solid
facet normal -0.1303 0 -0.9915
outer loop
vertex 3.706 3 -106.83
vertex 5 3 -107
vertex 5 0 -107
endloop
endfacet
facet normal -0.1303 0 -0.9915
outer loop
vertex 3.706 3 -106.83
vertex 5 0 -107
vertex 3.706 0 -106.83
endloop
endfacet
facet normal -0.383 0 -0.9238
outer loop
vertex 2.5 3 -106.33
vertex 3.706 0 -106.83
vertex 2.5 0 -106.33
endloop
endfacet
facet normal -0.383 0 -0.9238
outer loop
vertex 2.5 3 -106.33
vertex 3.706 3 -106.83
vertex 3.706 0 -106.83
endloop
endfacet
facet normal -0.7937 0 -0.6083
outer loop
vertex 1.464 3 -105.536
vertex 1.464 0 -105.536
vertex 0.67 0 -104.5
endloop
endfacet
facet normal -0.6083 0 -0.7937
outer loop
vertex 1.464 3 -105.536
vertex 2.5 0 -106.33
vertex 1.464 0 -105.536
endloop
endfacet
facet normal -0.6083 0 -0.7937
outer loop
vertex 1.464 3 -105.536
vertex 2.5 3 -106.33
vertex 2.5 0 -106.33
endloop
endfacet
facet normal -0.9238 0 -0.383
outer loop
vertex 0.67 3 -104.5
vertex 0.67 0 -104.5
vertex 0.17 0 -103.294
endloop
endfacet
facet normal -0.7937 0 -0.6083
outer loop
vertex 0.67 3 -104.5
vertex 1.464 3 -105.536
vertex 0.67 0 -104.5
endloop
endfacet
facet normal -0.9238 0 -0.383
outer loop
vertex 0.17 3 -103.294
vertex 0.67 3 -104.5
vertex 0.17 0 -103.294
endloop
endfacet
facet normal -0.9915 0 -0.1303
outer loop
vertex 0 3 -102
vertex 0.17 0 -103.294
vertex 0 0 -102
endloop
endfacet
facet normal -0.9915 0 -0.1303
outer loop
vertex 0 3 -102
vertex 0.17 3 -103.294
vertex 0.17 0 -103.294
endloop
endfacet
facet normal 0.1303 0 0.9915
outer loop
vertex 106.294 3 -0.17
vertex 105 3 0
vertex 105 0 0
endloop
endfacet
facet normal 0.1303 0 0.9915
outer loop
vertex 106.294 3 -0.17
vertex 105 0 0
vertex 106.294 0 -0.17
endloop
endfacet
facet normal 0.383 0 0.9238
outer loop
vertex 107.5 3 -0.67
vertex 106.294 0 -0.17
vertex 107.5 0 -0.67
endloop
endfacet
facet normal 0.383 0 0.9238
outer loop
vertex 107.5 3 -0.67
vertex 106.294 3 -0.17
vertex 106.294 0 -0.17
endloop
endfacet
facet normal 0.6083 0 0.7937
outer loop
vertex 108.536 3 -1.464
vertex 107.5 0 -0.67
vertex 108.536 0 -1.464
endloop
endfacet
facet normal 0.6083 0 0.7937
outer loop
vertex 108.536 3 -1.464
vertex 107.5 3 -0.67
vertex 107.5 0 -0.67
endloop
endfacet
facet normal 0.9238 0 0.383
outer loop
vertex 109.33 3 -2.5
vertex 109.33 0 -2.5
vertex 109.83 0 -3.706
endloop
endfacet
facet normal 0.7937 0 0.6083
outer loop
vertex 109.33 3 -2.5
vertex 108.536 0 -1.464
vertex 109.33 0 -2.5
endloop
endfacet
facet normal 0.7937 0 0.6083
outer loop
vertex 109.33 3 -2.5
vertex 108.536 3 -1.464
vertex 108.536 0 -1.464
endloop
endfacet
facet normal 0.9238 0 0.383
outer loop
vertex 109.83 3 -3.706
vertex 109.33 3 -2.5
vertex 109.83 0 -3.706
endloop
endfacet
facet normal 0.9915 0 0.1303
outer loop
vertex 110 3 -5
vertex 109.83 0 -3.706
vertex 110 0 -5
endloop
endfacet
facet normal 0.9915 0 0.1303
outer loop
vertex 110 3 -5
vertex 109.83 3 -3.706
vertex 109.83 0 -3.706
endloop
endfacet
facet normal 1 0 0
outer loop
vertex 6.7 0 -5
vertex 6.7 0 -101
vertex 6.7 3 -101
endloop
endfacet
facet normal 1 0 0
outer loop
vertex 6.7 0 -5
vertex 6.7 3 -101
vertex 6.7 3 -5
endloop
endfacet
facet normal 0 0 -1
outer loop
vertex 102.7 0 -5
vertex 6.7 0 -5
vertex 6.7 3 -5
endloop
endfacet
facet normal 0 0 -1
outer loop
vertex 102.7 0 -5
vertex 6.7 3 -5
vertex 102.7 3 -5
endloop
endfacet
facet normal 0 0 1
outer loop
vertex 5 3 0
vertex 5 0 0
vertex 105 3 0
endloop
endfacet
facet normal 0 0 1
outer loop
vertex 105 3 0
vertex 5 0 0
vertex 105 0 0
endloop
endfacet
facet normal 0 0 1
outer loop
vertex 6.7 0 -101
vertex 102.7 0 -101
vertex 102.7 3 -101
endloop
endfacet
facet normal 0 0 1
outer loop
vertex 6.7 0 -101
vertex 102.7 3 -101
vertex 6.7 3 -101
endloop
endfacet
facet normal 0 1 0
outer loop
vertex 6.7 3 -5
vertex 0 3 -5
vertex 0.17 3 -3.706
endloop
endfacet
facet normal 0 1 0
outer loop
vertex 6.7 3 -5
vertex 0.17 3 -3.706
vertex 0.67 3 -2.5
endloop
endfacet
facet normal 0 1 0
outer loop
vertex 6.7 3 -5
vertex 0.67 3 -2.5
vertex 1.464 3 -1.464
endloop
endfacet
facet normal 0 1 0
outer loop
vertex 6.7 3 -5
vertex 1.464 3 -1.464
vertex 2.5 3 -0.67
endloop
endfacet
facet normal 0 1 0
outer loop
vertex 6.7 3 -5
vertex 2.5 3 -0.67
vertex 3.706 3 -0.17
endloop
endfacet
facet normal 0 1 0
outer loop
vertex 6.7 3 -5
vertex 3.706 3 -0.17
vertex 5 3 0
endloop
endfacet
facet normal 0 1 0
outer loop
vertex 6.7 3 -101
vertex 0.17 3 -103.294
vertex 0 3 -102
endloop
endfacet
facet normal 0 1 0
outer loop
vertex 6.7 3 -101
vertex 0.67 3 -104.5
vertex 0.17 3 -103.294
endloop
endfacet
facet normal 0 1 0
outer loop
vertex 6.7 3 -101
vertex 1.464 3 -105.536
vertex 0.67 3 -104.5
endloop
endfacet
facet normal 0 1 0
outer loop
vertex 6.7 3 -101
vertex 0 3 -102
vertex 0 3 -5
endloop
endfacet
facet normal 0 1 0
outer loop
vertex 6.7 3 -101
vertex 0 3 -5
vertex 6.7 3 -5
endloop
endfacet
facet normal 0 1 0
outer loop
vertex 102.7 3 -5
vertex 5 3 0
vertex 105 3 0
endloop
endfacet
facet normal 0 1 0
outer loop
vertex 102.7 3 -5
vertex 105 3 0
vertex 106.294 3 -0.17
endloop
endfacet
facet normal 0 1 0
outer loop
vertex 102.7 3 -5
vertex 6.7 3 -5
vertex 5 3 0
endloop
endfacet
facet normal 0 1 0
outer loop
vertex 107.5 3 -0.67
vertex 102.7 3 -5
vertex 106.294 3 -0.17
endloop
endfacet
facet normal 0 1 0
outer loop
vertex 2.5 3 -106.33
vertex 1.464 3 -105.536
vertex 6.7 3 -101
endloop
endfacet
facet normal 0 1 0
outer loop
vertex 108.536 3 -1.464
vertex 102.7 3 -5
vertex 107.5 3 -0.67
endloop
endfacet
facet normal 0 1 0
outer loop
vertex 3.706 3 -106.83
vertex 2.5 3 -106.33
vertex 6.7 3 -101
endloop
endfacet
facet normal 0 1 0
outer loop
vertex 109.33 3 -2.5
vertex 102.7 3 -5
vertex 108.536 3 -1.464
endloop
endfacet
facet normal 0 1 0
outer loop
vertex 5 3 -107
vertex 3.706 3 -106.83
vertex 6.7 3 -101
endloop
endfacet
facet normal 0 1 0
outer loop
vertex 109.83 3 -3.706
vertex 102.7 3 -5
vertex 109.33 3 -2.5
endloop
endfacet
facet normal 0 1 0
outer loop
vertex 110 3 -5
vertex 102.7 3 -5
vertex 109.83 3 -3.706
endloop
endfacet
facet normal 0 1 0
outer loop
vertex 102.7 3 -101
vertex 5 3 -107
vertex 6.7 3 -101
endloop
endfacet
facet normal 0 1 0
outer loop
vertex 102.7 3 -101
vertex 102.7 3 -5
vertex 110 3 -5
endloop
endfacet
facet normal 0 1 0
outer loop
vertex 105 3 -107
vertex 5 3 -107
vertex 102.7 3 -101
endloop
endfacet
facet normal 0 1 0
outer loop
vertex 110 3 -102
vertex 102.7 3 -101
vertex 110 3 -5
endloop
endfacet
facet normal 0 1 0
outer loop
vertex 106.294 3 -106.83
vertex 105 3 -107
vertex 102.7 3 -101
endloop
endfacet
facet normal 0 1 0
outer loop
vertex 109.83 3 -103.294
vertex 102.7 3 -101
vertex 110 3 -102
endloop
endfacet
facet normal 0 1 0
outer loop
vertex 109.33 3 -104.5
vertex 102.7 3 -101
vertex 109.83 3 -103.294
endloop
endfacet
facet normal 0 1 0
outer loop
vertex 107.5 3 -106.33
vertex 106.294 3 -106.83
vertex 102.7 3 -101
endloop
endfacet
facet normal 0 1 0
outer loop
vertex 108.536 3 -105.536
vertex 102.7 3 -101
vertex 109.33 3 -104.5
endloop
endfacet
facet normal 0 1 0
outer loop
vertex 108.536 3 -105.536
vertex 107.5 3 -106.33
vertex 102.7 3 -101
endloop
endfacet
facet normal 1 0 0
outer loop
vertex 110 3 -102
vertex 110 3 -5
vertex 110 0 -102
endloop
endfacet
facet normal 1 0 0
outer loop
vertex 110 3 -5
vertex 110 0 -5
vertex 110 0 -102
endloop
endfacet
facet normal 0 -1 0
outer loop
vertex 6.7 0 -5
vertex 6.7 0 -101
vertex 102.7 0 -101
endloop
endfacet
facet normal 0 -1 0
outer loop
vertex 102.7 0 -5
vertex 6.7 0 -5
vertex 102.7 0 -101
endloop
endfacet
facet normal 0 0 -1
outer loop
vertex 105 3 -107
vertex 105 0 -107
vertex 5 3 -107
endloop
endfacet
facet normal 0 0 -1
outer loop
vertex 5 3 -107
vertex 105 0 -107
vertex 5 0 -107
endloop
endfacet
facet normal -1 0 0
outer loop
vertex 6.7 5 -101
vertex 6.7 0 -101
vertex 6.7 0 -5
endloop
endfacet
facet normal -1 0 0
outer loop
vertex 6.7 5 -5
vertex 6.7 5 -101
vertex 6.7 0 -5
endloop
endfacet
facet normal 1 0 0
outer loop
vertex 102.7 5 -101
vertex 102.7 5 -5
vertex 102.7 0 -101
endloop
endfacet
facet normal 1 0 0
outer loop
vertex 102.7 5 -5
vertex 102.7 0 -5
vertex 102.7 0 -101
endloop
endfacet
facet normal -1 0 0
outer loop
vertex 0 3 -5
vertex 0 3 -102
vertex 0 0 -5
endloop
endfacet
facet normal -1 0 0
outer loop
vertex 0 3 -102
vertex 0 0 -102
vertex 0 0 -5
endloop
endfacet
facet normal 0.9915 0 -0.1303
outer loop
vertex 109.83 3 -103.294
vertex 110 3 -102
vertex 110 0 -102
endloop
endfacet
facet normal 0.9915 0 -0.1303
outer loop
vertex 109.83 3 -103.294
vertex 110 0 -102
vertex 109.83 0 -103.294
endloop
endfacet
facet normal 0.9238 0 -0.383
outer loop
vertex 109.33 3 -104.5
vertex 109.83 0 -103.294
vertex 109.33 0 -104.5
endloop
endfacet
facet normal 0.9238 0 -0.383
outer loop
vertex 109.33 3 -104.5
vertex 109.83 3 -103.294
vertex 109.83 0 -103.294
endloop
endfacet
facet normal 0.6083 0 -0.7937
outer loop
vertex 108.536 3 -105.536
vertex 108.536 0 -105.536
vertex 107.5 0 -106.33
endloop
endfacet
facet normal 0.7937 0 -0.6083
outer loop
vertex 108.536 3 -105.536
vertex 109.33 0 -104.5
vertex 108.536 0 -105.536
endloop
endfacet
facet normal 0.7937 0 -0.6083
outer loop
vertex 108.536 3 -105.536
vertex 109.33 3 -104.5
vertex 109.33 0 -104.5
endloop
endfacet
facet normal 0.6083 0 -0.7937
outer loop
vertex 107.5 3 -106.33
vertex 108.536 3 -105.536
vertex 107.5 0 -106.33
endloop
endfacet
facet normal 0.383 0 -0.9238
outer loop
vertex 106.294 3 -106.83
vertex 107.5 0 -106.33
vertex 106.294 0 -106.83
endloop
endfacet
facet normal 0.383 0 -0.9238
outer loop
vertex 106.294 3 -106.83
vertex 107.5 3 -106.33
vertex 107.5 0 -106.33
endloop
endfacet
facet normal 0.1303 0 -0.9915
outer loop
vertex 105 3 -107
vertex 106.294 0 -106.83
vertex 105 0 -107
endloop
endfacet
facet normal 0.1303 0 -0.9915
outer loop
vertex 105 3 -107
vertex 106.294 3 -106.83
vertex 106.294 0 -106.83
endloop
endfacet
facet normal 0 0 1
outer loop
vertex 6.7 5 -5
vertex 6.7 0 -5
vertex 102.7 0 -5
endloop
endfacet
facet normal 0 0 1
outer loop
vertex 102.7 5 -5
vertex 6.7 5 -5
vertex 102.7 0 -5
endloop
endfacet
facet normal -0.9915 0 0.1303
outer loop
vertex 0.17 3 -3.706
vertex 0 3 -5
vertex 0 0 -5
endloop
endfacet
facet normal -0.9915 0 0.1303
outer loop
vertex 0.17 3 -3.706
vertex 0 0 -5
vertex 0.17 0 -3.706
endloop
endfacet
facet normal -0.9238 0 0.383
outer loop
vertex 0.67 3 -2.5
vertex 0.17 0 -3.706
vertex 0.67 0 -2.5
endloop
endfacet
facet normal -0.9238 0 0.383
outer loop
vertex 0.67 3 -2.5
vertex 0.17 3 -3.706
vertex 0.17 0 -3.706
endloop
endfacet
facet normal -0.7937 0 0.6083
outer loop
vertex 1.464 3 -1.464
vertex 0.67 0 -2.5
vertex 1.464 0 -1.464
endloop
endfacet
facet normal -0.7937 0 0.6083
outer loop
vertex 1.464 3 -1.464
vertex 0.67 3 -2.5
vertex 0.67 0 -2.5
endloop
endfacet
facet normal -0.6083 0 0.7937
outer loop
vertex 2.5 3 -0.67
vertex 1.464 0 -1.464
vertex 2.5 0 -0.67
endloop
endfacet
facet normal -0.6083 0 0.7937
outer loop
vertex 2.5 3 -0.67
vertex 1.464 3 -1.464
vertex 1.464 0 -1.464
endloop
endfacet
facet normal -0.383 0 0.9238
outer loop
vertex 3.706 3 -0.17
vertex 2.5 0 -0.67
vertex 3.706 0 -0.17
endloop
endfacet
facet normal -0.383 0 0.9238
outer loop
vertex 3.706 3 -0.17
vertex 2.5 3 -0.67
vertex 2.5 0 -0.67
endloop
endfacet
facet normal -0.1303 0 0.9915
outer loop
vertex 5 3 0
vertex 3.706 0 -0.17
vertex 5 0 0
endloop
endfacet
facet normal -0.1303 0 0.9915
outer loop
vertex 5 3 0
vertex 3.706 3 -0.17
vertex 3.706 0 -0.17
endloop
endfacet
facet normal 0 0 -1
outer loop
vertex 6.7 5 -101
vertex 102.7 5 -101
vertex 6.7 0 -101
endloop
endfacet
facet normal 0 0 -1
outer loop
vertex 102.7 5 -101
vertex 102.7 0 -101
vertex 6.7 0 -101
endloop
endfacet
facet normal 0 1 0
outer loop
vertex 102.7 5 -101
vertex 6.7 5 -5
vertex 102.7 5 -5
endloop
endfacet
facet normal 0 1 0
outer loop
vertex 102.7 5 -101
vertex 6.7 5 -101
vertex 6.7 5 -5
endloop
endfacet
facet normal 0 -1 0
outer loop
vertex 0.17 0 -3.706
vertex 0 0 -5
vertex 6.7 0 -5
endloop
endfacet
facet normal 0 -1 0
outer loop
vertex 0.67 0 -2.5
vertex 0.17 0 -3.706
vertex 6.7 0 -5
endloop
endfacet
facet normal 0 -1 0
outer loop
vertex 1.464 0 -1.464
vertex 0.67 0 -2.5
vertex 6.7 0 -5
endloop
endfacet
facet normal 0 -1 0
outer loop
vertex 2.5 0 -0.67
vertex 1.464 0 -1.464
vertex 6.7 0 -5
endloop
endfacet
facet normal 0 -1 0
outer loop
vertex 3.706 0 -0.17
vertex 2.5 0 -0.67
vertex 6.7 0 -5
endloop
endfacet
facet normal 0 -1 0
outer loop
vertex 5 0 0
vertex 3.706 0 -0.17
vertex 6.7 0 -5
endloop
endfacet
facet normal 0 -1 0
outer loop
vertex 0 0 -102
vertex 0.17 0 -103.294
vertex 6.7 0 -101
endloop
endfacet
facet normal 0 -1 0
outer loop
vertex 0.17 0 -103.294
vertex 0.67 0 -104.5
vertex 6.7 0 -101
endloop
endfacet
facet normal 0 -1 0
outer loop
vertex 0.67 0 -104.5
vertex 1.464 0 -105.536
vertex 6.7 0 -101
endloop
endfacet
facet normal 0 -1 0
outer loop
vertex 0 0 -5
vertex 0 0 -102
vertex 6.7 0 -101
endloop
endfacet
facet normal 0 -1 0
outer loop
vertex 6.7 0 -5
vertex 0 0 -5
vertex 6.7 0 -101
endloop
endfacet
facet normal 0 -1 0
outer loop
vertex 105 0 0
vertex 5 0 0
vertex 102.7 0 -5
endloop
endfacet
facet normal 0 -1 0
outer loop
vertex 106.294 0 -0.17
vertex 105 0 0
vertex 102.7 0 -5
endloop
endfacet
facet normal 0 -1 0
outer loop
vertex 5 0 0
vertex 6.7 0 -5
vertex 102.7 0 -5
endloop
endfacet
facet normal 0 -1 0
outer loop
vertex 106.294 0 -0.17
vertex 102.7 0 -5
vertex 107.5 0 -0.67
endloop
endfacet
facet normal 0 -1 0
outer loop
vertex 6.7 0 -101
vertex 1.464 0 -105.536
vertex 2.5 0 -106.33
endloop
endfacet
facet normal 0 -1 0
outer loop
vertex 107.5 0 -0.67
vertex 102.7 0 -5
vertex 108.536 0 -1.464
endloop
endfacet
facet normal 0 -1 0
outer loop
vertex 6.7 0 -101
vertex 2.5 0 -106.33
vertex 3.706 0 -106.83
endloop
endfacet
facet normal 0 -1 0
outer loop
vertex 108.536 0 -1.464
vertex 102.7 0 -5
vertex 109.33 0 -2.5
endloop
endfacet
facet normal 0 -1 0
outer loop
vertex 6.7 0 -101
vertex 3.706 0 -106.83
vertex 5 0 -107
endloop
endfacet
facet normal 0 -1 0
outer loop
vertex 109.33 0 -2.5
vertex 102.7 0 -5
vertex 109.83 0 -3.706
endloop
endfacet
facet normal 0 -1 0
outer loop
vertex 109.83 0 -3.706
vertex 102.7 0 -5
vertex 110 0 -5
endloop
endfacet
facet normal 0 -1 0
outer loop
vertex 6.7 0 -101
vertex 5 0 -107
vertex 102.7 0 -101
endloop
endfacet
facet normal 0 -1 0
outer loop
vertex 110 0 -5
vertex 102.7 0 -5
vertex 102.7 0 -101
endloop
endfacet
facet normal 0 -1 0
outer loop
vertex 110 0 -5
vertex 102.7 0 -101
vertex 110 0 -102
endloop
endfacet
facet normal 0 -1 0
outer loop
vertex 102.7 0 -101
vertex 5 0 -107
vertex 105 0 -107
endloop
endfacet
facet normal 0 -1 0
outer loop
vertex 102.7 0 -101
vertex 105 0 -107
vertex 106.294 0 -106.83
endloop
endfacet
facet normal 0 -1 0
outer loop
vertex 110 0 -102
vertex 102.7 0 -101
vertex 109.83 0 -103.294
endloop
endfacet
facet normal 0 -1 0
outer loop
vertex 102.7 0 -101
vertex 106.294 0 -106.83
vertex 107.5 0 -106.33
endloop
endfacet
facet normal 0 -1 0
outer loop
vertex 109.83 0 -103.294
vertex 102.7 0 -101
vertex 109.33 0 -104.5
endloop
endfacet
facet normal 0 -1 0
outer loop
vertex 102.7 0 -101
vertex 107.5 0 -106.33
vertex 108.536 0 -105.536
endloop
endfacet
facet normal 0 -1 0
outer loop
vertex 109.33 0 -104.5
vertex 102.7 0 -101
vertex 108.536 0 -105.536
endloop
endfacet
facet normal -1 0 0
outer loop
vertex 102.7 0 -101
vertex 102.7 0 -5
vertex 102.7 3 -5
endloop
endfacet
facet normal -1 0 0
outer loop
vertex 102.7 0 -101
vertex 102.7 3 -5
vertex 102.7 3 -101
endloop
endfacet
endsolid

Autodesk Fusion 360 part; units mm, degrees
sketch "Sketch1" plane through (0, 0, 0) normal (0, 1, 0) x (1, 0, 0)
  line L0 (0, 0) -> (110, 0)
  line L1 (110, 0) -> (110, 107)
  line L2 (110, 107) -> (0, 107)
  line L3 (0, 107) -> (0, 0)
  line L4 (6.7, 5) -> (102.7, 5)
  line L5 (102.7, 5) -> (102.7, 101)
  line L6 (102.7, 101) -> (6.7, 101)
  line L7 (6.7, 101) -> (6.7, 5)
  dimension "d1" = 110
  dimension "d2" = 107
  dimension "d3" = 96
  dimension "d4" = 5
  dimension "d5" = 96
  dimension "d6" = 5.4
  dimension "d7" = 6.7
  dimension "d8" = 7.3
extrude "Extrude2" add sketch "Sketch1" along normal blind 3 makes body 1
extrude "Extrude1" add sketch "Sketch1" along normal blind 5 separate body contours L4 L5 L6 L7 makes body 2
fillet "Fillet1" radius 5 4 edges at (0, 1.5, 0) (110, 1.5, 0) (110, 1.5, -107) (0, 1.5, -107) on bodies 1
